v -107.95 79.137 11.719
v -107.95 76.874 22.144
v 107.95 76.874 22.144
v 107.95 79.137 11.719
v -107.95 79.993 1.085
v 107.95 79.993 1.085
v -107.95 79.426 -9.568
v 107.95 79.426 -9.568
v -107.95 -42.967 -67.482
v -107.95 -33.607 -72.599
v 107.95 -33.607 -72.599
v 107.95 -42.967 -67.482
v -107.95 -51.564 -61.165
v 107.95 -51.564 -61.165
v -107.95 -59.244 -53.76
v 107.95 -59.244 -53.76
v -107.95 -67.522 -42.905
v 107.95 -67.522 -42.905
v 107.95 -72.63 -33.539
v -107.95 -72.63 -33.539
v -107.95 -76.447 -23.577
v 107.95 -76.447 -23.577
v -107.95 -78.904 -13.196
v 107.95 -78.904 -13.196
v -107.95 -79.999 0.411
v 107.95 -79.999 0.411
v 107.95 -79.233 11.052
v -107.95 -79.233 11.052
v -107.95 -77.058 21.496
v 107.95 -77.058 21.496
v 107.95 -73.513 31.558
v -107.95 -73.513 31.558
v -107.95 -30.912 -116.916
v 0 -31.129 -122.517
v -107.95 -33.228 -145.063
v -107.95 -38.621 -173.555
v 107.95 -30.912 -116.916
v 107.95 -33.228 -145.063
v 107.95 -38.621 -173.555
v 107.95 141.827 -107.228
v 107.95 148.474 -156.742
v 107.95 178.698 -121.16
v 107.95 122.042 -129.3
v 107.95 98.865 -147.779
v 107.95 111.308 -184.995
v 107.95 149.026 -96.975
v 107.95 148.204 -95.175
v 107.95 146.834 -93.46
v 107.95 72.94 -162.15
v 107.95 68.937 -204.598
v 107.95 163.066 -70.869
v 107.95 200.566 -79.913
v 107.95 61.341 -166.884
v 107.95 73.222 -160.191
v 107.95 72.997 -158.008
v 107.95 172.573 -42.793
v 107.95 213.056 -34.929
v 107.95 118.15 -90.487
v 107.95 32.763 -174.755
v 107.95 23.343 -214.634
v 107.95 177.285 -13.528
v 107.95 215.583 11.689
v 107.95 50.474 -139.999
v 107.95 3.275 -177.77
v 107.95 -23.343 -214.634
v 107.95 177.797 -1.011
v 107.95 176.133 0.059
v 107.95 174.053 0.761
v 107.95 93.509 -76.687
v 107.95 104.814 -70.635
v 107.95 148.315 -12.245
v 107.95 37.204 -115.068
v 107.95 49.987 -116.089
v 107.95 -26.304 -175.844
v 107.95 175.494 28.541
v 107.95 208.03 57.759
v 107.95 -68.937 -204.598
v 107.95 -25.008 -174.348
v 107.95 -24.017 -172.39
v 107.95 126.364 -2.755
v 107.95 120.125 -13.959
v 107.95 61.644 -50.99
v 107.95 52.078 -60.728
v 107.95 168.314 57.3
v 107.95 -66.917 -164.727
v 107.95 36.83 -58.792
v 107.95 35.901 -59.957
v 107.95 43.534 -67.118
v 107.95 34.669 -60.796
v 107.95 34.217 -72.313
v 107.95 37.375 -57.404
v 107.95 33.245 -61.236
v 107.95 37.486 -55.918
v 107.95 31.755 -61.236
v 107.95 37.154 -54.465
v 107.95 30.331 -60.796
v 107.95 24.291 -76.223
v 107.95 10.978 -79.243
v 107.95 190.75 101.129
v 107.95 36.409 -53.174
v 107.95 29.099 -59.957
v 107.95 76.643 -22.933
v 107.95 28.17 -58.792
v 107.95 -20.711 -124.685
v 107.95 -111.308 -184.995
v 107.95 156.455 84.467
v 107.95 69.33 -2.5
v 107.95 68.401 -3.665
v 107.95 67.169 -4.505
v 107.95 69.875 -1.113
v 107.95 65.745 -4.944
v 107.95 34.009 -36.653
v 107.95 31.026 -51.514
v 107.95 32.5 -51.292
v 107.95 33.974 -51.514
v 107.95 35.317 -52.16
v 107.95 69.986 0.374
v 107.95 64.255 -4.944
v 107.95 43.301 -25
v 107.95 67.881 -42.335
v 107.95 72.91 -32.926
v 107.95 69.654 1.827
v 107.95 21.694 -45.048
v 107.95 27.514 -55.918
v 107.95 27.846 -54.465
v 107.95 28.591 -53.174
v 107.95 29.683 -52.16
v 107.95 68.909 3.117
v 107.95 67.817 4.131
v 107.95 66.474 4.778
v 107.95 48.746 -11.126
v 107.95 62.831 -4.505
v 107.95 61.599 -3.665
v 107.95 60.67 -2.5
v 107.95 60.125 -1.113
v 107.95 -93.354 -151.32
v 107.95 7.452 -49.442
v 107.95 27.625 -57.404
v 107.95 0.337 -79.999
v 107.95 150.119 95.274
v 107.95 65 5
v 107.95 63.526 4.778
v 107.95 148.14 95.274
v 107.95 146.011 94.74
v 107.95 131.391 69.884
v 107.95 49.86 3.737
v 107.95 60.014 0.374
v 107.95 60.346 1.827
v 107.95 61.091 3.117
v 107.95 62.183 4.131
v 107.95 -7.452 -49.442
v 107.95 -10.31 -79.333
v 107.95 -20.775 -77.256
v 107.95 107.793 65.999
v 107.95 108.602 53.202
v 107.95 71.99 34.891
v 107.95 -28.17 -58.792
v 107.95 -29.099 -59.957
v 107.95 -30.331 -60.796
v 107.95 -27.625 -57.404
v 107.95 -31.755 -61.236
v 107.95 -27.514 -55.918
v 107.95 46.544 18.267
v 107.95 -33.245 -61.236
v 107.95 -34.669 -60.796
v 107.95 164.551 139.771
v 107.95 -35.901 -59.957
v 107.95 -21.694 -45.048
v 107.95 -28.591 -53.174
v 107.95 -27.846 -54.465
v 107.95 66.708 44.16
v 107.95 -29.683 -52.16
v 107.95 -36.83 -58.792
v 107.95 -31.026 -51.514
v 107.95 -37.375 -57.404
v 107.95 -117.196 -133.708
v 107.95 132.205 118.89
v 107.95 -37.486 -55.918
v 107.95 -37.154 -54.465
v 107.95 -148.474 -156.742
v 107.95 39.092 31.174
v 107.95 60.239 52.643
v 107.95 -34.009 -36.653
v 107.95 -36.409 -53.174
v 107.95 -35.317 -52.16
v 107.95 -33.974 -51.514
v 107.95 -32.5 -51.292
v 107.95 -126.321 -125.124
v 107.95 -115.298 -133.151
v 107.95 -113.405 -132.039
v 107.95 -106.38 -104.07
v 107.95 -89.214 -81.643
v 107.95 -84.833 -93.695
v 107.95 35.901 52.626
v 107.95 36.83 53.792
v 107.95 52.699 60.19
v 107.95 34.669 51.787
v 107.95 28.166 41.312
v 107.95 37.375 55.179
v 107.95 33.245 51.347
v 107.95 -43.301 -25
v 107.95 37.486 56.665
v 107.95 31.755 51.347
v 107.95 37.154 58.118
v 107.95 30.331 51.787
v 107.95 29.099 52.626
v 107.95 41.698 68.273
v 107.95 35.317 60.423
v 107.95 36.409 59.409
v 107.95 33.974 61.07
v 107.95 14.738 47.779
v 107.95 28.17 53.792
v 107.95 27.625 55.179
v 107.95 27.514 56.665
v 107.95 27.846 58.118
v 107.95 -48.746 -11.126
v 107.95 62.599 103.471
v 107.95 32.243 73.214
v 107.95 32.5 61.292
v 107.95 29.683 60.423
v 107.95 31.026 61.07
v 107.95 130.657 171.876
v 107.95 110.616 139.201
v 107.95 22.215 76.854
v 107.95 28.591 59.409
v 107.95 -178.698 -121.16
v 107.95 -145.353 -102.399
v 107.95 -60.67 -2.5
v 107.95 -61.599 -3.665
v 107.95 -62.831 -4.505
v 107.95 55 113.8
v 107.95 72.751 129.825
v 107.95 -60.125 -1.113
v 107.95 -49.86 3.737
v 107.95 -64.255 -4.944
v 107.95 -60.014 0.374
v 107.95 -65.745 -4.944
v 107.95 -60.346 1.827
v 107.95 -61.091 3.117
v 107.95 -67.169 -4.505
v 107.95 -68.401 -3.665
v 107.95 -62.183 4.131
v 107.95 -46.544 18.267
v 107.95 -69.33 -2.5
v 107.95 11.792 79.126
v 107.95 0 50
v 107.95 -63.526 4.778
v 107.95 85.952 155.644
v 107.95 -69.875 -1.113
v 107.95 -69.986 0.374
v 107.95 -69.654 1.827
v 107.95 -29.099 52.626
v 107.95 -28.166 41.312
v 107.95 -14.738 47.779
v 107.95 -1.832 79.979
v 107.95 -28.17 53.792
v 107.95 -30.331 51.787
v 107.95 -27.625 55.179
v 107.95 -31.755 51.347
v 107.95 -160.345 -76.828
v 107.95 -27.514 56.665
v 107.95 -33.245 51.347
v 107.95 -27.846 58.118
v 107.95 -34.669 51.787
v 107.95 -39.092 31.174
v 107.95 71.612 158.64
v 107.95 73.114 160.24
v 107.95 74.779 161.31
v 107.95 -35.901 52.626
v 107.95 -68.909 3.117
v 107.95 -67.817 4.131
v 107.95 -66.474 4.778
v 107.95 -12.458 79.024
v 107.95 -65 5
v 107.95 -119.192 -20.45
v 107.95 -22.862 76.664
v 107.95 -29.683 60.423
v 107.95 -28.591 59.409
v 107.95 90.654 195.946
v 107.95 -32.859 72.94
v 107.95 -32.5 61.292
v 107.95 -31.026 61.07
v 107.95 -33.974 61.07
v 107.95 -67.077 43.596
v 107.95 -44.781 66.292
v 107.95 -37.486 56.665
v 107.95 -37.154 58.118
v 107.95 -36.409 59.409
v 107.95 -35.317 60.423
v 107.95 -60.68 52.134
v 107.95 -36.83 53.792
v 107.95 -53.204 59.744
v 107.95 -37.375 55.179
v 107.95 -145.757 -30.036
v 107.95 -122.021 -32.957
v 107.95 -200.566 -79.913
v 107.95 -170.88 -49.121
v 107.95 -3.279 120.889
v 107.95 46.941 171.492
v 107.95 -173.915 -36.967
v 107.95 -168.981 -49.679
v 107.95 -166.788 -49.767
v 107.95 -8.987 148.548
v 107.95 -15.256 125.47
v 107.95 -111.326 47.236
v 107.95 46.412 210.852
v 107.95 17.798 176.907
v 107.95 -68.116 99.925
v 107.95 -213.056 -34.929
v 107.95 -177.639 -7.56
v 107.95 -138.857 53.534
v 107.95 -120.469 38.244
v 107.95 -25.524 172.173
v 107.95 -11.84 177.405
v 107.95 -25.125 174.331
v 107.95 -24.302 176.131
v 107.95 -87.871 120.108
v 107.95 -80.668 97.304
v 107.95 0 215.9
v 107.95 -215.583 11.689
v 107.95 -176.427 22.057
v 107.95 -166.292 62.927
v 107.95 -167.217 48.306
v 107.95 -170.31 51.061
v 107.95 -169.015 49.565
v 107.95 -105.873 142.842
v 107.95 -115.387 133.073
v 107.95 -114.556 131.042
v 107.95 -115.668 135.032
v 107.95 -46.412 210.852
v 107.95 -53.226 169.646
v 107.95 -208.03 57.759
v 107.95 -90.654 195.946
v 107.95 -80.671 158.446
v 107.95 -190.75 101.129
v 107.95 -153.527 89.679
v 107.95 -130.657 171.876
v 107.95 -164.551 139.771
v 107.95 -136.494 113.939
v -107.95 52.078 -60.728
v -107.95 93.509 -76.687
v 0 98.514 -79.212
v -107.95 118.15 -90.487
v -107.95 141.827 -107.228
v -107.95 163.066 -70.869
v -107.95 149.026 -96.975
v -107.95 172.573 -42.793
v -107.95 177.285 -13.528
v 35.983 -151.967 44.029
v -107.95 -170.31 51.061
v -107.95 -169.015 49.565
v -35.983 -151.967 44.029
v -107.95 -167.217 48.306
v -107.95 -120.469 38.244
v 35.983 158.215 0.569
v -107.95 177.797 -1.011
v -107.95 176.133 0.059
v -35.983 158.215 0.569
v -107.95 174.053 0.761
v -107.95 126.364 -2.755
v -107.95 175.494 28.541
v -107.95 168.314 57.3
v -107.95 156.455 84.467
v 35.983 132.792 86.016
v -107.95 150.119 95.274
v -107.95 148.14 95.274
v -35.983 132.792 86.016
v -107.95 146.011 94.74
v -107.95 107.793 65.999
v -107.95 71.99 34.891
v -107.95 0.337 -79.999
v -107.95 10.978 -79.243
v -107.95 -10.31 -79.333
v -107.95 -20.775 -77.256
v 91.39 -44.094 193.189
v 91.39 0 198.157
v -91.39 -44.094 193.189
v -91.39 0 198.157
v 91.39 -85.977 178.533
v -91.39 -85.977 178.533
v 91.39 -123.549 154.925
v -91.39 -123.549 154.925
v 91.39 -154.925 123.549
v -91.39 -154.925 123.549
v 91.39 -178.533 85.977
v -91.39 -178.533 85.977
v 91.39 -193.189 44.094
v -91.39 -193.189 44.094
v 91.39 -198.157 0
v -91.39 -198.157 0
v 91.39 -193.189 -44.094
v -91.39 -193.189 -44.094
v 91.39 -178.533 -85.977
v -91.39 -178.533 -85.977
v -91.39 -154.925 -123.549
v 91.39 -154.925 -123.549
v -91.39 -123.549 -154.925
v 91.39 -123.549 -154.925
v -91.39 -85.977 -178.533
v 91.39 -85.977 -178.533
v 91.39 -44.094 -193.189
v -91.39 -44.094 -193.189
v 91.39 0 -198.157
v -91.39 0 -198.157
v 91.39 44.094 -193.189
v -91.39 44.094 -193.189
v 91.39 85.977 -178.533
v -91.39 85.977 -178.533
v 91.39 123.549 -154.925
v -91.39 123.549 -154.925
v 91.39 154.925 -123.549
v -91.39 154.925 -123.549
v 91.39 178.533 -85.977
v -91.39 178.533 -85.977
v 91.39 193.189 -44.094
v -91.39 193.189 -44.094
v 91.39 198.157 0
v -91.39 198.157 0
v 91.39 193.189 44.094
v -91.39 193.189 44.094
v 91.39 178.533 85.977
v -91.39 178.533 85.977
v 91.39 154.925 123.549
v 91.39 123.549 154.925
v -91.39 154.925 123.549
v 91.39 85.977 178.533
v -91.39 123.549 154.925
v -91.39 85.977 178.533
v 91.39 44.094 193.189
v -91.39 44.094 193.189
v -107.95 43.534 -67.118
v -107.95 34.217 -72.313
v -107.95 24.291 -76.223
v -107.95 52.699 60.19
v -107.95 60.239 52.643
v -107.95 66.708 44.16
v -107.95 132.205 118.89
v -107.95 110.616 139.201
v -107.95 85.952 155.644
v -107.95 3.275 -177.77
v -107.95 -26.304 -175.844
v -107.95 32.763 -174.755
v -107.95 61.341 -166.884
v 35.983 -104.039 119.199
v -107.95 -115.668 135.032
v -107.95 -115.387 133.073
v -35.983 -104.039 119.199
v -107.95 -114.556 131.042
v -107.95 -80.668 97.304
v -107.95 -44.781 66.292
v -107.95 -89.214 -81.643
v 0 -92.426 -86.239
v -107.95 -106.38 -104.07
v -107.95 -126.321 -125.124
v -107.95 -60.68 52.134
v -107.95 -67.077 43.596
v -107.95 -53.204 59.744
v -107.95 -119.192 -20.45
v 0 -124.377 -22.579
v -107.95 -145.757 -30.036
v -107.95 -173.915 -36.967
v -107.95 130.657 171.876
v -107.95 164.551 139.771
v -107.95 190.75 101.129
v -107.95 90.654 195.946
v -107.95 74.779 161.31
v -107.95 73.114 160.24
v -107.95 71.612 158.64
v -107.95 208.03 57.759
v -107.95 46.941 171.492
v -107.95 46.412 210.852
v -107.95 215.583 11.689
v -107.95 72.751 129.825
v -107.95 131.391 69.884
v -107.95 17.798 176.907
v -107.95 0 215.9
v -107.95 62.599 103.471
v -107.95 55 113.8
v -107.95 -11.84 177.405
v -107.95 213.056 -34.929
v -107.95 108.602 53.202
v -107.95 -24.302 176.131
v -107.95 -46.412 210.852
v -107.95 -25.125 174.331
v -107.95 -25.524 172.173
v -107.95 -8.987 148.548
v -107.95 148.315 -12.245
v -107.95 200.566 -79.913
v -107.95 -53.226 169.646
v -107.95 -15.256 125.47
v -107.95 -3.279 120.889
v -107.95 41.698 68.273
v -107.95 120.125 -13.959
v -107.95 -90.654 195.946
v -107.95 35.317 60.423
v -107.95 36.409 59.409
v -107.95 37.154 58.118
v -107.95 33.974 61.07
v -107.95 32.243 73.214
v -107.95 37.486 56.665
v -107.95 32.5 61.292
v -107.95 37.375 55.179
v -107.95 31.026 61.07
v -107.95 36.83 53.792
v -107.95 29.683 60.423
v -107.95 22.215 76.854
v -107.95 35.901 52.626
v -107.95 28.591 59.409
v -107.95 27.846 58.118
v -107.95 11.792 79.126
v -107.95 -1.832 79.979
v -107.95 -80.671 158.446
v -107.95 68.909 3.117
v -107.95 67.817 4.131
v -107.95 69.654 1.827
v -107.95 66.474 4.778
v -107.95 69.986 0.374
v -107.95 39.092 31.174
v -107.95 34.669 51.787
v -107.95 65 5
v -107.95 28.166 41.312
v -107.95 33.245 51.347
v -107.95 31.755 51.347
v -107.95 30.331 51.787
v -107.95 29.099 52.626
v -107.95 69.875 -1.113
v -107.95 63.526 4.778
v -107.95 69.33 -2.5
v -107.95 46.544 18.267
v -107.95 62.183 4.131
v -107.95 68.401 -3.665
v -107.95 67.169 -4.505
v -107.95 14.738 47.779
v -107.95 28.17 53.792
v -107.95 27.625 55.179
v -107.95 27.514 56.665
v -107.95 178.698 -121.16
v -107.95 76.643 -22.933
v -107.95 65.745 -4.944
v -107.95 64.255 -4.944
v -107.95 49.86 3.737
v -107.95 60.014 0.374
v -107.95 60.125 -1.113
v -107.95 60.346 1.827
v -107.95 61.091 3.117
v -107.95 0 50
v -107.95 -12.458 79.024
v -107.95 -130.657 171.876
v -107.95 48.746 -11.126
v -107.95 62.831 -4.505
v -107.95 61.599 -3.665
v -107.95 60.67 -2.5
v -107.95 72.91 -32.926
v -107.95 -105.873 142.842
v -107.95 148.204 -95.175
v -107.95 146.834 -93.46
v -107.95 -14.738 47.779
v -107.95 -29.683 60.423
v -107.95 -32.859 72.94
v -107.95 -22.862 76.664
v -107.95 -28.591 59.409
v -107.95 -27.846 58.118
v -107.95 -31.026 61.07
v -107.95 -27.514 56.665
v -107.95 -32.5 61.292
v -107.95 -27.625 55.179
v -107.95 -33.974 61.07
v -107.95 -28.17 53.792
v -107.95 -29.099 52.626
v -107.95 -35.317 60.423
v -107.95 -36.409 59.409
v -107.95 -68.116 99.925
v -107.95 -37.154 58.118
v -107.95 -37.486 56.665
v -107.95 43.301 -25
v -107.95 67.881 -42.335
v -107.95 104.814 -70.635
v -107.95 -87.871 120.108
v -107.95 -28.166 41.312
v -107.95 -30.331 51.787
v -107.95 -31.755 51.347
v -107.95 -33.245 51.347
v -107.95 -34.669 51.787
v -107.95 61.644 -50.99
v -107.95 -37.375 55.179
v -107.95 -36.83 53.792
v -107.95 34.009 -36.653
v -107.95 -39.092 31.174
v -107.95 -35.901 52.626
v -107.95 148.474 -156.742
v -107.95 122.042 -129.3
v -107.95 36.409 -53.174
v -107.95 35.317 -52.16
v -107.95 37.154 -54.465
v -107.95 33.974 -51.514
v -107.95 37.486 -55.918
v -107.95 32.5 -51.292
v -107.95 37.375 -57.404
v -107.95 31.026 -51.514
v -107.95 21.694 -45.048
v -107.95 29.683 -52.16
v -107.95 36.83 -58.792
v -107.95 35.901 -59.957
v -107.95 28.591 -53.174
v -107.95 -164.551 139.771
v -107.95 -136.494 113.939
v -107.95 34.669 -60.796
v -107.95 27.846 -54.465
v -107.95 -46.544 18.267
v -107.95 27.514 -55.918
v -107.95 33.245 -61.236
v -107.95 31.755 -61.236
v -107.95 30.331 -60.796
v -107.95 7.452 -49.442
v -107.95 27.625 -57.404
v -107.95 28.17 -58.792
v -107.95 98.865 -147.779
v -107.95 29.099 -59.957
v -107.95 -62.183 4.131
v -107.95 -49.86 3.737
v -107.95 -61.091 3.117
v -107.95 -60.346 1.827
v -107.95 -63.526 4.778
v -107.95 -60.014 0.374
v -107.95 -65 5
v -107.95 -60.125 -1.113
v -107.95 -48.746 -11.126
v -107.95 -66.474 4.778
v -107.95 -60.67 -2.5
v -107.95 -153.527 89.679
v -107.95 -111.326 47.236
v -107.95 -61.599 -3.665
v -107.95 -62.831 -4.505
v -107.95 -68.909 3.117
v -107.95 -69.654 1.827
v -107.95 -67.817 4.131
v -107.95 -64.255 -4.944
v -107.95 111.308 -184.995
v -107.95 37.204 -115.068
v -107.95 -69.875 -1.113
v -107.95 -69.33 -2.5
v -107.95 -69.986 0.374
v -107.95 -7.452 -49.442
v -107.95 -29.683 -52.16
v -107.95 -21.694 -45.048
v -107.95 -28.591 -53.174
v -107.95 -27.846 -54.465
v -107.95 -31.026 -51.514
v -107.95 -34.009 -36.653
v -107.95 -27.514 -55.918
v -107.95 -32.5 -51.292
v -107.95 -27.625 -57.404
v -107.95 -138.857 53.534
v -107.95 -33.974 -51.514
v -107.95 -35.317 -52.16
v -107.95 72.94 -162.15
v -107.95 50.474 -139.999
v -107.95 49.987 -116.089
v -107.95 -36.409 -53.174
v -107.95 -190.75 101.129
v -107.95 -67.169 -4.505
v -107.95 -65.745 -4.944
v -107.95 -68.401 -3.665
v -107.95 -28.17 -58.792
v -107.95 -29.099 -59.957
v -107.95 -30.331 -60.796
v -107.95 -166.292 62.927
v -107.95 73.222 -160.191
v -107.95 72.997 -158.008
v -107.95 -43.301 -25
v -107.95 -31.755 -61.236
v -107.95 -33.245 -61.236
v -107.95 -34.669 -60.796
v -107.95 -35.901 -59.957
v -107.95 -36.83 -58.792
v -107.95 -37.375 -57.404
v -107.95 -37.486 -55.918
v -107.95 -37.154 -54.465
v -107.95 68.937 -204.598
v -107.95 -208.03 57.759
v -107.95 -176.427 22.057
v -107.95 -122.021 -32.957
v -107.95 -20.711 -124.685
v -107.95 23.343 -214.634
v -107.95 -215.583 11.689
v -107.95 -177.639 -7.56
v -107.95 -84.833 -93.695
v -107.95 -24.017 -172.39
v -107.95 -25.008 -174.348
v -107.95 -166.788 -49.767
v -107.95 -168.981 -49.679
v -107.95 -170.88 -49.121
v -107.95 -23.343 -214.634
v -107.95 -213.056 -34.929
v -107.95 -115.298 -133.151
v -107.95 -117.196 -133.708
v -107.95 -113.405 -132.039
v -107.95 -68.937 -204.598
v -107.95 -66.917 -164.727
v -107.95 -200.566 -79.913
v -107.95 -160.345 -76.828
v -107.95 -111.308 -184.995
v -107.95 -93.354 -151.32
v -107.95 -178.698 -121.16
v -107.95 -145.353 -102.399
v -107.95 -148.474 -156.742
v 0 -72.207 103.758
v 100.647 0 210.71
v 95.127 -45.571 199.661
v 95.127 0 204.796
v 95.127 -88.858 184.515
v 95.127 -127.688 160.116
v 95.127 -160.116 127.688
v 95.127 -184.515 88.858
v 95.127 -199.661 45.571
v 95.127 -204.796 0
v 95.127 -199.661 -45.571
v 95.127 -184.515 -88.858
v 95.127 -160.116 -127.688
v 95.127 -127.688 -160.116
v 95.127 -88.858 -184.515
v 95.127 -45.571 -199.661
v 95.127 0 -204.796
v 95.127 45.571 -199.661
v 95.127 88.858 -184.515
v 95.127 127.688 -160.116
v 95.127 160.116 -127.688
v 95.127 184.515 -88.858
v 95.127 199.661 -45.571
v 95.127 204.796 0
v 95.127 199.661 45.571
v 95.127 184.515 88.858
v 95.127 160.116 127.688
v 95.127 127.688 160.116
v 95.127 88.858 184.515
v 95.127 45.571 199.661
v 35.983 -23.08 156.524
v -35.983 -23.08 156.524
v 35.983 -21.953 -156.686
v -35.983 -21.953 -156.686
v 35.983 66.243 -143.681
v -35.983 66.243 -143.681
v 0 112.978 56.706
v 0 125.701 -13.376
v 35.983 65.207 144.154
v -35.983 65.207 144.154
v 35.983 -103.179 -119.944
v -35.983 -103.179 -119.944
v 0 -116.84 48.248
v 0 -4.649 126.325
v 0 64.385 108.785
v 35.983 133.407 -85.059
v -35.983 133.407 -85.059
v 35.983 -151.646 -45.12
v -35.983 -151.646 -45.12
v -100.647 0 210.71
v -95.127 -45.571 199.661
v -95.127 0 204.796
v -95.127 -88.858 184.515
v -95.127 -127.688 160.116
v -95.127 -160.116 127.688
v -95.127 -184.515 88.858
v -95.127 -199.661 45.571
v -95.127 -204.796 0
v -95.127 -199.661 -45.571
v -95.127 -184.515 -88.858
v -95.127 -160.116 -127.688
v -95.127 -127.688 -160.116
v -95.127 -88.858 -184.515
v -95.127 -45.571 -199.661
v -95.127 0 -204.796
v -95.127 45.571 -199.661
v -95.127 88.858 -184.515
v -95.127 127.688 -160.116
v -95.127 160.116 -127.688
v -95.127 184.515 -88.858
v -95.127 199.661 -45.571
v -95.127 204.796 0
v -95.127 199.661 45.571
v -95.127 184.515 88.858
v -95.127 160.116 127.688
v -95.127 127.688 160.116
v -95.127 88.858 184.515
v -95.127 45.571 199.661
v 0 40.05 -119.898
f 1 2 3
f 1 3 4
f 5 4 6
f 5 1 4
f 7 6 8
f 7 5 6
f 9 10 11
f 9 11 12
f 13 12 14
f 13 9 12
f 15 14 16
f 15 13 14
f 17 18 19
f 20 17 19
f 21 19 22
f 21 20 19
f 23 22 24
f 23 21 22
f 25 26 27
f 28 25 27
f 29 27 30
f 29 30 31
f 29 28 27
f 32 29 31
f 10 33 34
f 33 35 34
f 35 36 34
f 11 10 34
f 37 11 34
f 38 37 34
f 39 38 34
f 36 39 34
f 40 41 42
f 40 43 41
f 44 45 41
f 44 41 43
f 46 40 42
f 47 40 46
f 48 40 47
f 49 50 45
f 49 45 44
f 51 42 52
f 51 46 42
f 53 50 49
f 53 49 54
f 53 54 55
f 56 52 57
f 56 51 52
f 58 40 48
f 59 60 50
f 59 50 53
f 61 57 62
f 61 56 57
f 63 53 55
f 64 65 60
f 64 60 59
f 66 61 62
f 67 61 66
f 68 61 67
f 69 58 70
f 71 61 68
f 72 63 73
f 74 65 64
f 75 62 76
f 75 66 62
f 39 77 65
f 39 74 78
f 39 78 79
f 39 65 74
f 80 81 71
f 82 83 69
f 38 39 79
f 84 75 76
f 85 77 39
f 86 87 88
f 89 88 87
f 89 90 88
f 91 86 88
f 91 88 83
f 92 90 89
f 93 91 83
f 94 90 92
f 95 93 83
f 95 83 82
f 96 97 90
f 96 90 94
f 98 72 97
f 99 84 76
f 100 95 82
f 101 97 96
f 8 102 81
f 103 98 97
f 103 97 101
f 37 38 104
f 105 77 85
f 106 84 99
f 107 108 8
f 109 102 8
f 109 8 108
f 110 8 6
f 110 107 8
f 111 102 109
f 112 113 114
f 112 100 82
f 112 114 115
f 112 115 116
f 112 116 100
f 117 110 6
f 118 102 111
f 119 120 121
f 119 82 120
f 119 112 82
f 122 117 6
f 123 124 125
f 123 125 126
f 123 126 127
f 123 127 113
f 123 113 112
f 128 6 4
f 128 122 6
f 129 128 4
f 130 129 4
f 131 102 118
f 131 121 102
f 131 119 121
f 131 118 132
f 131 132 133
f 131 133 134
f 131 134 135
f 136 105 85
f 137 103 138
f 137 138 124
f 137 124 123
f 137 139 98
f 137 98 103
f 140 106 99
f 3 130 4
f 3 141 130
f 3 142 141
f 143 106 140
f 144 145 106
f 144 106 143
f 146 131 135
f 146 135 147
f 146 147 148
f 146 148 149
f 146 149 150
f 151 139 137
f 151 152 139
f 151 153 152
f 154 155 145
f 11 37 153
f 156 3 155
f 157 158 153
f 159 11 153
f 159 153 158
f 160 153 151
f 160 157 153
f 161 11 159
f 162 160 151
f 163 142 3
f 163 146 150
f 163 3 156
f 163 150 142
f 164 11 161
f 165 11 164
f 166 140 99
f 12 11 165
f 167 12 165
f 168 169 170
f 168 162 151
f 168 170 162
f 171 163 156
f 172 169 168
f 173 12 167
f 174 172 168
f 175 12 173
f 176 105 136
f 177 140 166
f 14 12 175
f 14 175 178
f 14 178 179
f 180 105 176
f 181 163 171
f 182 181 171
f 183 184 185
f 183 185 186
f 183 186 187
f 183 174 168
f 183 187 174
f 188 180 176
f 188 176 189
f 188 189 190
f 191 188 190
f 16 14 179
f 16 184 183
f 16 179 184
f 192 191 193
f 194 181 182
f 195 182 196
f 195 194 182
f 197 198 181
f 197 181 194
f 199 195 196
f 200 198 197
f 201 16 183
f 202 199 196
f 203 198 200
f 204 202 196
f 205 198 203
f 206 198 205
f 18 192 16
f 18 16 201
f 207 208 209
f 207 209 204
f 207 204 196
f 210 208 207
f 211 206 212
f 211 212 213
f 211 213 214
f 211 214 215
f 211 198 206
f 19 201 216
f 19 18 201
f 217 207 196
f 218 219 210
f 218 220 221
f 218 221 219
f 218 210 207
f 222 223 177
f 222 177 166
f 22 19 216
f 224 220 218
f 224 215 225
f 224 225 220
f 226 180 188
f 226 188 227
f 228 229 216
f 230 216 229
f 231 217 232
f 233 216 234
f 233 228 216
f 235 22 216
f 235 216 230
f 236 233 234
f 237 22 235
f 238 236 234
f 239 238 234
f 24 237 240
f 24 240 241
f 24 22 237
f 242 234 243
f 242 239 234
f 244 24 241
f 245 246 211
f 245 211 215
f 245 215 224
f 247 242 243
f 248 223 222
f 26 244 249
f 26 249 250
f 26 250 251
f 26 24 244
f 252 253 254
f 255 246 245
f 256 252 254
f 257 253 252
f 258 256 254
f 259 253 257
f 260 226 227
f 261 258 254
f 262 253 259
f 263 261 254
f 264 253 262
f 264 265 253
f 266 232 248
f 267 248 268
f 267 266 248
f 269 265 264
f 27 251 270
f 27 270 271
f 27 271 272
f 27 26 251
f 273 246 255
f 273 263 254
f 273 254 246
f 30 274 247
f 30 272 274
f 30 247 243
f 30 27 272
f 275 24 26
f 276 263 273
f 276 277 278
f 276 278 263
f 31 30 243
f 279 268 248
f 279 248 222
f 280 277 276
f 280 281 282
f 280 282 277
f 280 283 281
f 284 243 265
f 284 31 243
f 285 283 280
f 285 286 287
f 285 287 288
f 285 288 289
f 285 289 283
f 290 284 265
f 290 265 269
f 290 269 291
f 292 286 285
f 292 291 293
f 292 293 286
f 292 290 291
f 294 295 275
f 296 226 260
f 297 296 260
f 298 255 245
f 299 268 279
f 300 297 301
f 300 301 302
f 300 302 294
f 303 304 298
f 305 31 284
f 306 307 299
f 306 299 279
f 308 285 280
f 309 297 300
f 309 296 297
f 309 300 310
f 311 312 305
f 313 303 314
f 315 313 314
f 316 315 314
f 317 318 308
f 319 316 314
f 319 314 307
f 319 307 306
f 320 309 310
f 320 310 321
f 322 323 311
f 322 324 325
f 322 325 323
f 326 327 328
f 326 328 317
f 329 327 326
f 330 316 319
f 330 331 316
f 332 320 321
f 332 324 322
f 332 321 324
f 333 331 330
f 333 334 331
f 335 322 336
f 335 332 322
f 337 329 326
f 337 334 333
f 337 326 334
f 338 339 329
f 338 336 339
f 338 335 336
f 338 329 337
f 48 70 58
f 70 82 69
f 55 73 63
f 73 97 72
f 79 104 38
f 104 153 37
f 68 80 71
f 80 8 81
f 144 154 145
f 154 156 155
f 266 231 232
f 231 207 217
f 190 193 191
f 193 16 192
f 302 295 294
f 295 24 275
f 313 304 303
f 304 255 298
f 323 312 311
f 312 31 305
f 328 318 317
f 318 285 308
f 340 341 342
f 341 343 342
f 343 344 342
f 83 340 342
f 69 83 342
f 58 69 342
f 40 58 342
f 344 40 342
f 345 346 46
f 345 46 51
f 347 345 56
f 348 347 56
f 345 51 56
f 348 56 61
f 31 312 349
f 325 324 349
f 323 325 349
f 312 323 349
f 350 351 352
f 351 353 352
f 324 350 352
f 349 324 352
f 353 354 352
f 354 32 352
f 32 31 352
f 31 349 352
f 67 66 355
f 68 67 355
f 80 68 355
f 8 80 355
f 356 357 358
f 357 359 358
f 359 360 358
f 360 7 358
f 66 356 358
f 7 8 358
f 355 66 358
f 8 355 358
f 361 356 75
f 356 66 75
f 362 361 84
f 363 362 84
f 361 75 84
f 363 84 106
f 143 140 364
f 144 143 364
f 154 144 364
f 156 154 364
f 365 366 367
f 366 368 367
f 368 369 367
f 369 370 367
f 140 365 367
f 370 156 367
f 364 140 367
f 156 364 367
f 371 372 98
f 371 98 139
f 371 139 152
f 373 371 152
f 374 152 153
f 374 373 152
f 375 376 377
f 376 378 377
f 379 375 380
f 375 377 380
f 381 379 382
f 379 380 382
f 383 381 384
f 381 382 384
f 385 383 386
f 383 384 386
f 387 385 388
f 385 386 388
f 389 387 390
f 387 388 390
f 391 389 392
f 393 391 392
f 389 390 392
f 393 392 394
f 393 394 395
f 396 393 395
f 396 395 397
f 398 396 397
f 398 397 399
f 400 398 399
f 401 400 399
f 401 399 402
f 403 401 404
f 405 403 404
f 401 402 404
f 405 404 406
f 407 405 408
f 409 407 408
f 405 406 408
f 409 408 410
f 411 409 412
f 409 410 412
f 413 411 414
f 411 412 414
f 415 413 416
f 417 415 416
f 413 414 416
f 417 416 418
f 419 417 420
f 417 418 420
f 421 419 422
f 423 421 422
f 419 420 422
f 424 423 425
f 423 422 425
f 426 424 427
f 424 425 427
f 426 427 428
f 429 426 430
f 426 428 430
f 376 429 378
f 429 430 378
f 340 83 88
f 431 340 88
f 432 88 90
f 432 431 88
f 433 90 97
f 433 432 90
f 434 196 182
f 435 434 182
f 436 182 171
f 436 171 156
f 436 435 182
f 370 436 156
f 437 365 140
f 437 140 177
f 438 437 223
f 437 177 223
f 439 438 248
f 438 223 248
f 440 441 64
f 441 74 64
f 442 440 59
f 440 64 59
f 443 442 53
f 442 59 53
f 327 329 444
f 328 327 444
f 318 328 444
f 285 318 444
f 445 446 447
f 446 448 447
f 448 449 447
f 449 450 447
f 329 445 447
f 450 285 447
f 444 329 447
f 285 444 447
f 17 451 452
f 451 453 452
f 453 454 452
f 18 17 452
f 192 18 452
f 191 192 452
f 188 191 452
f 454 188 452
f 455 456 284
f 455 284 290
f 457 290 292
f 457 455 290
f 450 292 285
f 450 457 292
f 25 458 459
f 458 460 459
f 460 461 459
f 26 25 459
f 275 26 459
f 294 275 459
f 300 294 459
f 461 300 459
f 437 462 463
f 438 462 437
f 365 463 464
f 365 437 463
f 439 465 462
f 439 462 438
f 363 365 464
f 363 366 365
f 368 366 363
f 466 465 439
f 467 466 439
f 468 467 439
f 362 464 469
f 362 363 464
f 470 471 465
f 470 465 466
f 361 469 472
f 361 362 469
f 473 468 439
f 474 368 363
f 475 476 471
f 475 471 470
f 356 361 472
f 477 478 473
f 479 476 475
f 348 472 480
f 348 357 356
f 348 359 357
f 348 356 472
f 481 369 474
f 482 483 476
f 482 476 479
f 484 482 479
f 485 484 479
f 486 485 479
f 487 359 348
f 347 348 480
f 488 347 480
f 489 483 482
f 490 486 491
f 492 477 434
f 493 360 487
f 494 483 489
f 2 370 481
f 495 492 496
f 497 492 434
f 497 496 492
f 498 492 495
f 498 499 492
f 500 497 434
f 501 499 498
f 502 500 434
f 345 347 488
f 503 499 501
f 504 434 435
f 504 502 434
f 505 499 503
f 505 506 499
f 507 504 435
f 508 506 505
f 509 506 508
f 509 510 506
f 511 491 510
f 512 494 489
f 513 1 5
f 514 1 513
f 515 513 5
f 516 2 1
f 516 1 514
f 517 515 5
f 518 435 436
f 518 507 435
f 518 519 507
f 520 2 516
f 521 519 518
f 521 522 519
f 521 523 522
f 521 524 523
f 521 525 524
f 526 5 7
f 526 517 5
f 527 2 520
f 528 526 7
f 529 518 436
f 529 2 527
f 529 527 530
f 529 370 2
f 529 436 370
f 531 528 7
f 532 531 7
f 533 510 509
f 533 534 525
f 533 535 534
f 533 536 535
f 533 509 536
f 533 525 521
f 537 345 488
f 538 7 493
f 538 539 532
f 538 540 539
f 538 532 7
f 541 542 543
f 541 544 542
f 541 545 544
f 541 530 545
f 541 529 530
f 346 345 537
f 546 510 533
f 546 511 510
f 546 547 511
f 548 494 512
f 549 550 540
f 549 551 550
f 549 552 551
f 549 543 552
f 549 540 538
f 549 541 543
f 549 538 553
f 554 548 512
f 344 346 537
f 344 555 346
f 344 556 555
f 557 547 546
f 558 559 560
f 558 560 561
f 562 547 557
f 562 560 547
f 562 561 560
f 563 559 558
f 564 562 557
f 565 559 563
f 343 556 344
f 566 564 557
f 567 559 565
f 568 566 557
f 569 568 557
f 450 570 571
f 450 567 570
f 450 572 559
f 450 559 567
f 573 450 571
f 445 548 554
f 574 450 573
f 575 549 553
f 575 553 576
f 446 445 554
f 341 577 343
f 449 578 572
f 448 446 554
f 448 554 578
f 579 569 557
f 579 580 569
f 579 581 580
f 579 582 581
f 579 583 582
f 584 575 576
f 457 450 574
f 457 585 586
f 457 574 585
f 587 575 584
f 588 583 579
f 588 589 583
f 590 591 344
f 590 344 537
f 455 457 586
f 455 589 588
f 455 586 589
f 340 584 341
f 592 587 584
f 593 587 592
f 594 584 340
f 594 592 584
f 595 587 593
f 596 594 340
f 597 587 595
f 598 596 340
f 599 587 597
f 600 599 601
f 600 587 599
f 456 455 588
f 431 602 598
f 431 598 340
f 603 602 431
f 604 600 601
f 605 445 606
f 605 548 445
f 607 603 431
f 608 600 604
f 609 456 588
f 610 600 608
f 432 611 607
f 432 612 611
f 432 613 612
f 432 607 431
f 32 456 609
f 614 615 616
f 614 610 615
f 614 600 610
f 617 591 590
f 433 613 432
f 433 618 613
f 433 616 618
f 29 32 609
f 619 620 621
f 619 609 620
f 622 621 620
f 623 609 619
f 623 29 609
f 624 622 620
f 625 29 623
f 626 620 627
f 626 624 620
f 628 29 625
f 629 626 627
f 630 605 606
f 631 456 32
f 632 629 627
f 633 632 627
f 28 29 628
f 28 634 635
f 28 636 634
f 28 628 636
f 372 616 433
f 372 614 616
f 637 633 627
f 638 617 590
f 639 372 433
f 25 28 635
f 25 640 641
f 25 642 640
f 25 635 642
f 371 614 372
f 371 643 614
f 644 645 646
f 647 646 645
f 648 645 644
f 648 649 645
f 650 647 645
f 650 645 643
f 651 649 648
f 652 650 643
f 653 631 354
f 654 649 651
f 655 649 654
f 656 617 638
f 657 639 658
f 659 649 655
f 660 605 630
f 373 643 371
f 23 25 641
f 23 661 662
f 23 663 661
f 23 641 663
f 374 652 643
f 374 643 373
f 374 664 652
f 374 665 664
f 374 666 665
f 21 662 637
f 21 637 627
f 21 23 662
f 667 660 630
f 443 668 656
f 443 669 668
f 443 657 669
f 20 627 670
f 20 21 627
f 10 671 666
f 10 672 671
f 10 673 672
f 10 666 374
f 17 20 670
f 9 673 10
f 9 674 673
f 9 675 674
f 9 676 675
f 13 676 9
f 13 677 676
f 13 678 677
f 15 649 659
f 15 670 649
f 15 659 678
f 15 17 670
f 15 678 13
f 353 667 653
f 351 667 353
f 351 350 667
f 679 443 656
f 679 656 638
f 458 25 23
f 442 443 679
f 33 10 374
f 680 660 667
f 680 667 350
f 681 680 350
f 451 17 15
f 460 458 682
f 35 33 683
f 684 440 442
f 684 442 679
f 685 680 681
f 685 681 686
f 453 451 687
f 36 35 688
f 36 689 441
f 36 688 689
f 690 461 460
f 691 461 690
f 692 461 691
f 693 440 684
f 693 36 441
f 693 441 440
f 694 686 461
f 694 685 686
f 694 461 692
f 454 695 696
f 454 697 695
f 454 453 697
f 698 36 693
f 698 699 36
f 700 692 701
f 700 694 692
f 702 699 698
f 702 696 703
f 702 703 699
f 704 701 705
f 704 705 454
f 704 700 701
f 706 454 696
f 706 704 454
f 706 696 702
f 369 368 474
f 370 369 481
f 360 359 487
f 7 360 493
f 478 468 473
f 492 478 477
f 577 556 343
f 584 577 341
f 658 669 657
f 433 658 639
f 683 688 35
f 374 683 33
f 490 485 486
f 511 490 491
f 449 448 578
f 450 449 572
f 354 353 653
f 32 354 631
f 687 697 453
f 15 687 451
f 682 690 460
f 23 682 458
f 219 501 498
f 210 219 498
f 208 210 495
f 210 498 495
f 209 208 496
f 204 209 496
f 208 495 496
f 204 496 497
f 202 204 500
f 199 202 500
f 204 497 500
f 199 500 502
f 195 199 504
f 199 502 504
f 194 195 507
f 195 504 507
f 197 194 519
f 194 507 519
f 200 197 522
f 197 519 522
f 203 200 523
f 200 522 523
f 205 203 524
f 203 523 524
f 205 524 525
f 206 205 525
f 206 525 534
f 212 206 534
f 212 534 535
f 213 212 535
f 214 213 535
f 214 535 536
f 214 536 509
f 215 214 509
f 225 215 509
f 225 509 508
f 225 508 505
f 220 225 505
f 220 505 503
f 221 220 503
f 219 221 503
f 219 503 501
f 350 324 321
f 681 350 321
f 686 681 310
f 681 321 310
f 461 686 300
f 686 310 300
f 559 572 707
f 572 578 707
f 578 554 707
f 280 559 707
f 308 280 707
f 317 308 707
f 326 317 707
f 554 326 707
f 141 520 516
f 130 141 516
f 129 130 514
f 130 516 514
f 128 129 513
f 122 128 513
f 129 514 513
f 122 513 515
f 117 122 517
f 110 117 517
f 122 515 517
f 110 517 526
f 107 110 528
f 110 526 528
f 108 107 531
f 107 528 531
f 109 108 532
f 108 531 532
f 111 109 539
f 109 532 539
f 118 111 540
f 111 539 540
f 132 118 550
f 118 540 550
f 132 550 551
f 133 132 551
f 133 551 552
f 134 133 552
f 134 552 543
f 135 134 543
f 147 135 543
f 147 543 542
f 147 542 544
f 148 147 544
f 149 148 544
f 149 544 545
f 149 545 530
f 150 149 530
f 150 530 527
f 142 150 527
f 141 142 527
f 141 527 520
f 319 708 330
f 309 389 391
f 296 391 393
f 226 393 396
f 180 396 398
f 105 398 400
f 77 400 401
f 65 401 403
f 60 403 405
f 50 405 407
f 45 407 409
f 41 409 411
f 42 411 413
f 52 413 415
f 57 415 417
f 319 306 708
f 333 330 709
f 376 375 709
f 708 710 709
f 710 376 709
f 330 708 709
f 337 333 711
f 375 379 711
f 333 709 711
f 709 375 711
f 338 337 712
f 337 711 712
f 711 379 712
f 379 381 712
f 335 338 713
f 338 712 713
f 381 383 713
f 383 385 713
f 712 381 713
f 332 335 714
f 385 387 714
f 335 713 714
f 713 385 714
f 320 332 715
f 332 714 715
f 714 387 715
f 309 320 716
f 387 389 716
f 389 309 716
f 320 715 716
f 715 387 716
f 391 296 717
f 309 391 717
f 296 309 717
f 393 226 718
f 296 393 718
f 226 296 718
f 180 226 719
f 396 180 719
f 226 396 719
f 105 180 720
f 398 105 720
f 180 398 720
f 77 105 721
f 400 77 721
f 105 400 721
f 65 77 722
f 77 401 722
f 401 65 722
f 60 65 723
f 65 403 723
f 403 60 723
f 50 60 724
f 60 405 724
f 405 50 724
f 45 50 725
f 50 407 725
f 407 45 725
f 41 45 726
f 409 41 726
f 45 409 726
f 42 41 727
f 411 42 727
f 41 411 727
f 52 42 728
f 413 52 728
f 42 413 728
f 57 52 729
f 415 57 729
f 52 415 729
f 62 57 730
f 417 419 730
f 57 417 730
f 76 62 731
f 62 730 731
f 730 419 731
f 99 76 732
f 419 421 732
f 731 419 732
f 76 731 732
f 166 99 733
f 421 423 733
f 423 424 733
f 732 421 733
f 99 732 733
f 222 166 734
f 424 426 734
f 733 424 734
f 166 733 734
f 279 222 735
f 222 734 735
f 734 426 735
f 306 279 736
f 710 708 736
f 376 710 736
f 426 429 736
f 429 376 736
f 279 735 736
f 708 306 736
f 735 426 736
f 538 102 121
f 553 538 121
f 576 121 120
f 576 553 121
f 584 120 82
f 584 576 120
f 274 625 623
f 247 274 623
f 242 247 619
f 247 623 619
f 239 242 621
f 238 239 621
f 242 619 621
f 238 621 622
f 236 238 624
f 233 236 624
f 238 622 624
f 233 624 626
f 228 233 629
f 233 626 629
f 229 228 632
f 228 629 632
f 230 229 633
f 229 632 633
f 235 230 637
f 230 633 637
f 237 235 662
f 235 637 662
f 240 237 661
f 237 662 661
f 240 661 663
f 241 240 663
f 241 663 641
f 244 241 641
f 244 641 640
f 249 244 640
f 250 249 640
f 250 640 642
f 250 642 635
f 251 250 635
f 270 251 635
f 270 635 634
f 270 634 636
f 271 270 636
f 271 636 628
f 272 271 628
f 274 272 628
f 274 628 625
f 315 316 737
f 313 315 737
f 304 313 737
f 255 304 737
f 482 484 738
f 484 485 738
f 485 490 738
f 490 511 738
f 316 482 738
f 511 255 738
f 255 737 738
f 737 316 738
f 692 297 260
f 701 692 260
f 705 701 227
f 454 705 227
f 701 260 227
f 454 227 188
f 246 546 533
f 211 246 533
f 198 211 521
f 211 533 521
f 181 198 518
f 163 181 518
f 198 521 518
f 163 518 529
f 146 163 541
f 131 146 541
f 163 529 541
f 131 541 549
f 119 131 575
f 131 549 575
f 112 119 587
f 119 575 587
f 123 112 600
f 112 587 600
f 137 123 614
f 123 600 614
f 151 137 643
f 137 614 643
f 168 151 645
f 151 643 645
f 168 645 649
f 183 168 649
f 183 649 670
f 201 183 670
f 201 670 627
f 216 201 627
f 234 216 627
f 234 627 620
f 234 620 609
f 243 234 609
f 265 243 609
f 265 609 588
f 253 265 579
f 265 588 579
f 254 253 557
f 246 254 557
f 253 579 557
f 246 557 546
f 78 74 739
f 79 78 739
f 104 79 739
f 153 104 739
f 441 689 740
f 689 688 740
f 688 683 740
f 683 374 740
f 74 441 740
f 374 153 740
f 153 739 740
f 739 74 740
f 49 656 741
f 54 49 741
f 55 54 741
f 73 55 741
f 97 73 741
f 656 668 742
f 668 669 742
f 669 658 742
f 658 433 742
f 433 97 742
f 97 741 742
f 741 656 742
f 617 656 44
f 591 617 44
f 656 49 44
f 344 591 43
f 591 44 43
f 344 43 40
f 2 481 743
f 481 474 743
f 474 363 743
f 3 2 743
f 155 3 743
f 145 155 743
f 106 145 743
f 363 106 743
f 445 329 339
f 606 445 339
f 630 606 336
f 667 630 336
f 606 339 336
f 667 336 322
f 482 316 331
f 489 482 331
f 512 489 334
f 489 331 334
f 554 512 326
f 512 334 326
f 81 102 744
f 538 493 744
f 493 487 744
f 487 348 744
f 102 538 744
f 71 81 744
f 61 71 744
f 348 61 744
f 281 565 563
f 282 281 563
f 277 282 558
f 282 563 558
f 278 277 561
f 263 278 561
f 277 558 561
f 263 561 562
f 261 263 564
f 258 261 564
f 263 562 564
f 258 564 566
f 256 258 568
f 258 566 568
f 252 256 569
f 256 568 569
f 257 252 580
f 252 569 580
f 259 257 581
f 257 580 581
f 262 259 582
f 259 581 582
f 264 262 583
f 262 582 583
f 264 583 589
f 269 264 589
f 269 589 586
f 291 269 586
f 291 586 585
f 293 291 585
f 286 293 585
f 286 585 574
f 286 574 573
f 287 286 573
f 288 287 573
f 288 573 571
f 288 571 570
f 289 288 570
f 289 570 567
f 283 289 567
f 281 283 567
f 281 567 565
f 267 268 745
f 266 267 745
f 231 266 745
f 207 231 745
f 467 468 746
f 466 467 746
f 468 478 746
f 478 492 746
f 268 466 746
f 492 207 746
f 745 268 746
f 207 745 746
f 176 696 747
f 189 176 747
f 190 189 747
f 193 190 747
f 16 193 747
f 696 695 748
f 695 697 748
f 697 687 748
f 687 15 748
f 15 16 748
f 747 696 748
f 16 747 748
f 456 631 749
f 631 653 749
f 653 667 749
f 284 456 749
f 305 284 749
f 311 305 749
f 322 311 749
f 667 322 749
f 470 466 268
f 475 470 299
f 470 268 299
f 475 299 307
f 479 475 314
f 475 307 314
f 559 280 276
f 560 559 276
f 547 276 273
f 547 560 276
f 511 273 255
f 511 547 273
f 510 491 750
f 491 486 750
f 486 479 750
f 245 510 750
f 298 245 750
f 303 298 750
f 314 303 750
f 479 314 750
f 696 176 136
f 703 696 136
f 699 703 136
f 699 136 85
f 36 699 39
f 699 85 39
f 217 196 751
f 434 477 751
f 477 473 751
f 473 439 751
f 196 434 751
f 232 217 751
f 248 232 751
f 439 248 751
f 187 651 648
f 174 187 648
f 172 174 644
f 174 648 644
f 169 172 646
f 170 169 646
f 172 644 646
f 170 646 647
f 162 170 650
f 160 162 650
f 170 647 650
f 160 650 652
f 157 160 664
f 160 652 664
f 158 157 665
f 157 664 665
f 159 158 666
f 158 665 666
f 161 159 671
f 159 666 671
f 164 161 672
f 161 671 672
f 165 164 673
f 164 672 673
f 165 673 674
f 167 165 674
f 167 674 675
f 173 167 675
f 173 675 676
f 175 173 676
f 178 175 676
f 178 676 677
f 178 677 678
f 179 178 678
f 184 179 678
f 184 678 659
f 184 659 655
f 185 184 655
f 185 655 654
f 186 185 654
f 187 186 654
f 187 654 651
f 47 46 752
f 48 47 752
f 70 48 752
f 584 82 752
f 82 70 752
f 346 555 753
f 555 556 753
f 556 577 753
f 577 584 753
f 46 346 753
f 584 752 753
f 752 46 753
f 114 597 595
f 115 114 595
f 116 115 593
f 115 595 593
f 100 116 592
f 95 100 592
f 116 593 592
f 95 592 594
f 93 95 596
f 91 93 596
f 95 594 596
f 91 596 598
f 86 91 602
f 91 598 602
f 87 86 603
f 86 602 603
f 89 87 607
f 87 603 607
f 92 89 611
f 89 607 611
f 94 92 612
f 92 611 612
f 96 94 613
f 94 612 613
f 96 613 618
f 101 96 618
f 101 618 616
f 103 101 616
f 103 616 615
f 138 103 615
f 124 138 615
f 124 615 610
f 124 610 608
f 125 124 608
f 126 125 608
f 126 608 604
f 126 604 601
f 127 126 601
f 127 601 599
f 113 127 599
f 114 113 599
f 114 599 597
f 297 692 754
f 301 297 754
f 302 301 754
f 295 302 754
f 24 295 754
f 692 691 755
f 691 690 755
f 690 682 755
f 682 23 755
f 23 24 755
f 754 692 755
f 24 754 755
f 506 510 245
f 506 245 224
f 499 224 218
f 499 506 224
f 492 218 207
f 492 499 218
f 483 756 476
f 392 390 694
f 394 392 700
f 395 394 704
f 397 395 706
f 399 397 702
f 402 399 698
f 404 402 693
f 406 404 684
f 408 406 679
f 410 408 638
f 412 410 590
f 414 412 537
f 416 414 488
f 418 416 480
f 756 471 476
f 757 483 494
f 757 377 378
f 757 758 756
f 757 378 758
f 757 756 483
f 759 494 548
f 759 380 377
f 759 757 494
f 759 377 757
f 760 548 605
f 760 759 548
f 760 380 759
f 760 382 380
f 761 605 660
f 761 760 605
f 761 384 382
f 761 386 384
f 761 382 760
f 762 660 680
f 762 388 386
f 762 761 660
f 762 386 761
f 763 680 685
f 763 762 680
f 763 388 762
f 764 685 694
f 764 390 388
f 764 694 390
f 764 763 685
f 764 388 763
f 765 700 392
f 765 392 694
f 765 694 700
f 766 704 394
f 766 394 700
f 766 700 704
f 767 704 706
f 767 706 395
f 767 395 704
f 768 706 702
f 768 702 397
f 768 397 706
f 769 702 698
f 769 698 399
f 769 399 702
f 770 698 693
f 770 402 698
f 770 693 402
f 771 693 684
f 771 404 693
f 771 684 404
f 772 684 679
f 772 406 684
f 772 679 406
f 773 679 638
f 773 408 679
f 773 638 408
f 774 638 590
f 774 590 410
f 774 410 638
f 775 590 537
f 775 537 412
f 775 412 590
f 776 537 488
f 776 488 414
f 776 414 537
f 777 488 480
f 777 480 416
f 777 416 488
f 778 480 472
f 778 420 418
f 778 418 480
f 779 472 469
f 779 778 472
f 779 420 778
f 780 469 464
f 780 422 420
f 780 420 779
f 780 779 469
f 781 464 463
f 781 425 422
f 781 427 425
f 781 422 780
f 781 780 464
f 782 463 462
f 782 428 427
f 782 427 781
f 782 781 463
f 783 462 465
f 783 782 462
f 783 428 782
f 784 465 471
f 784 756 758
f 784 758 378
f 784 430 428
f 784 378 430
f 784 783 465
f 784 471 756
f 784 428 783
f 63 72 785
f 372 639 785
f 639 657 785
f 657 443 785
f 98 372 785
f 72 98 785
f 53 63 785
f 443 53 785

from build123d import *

# Parameters (mm, degrees)
SKETCH4_R           = 80
SKETCH4_R_2         = 50
EXTRUDE_THIN3_DEPTH = 215.9
BOSS_EXTRUDE5_DEPTH = 215.9
SKETCH7_R           = 5
CUT_EXTRUDE1_DEPTH  = 374.949769527


with BuildPart() as part:
    # Sketch1 → Revolve2 (revolve)
    with BuildSketch(Plane.XY, mode=Mode.PRIVATE) as revolve2_sk:
        with BuildLine():
            add(Edge.make_bspline(
                [(-91.389791645, 198.157117378), (-87.737723978, 189.172063745), (-89.958333333, 177.8)],
                knots=[0.538920679, 0.538920679, 0.538920679, 1, 1, 1], degree=2))
            Line((-89.958333333, 177.8), (89.958333333, 177.8))
            add(Edge.make_bspline(
                [(91.389791645, 198.157117378), (87.737723978, 189.172063745), (89.958333333, 177.8)],
                knots=[0.538920679, 0.538920679, 0.538920679, 1, 1, 1], degree=2))
            Line((91.389791645, 198.157117378), (-91.389791645, 198.157117378))
        make_face()
        with BuildLine():
            add(Edge.make_bspline(
                [(-107.95, 215.9), (-85.142221979, 202.464007291), (-89.958333333, 177.8)],
                knots=[0, 0, 0, 1, 1, 1], degree=2))
            Line((-89.958333333, 177.8), (-107.95, 177.8))
            Line((-107.95, 177.8), (-107.95, 215.9))
        make_face()
        with BuildLine():
            Line((107.95, 215.9), (107.95, 177.8))
            Line((107.95, 177.8), (89.958333333, 177.8))
            add(Edge.make_bspline(
                [(107.95, 215.9), (85.142221979, 202.464007291), (89.958333333, 177.8)],
                knots=[0, 0, 0, 1, 1, 1], degree=2))
        make_face()
    revolve(revolve2_sk.sketch.rotate(Axis((0, 0, 0), (1, 0, 0)), 90), axis=Axis((0, 0, 0), (1, 0, 0)))



with BuildPart() as body_2:
    # Sketch4 → Extrude-Thin3 (new, through all)
    with BuildSketch(Plane.ZY.offset(107.95)):
        Circle(SKETCH4_R)
        Circle(SKETCH4_R_2, mode=Mode.SUBTRACT)
    extrude(amount=-EXTRUDE_THIN3_DEPTH)


with BuildPart() as part_1:
    add(part.part)

    add(body_2.part)  # Boss-Extrude5 merges body 2
    # Sketch5 → Boss-Extrude5 (add, through all)
    with BuildSketch(Plane.ZY.offset(107.95)):
        with BuildLine():
            add(Edge.make_bspline(
                [(84.466613731, 156.455204978), (103.265760756, 154.155986618), (86.563054422, 133.698232311), (61.815758586, 101.70440423), (37.155549156, 74.715687445), (20.962946955, 56.218812287)],
                knots=[0, 0, 0, 0, 0.24250624, 0.41767252, 1, 1, 1, 1], degree=3))
            add(Edge.make_bspline(
                [(0, 60), (11.003820956, 59.93238473), (20.962946955, 56.218812287)],
                knots=[0, 0, 0, 0.88641076, 0.88641076, 0.88641076], degree=2))
            add(Edge.make_bspline(
                [(0, 60), (53.338766253, 96.187425341), (84.466613731, 156.455204978)],
                knots=[0, 0, 0, 1, 1, 1], degree=2))
        make_face()
        with BuildLine():
            add(Edge.make_bspline(
                [(155.643907122, 85.952394823), (170.215704677, 73.854583039), (145.104196955, 65.674589761), (106.988277537, 52.13906711), (71.651587329, 42.767029552), (48.029337815, 35.96084967)],
                knots=[0, 0, 0, 0, 0.24250624, 0.41767252, 1, 1, 1, 1], degree=3))
            add(Edge.make_bspline(
                [(32.438449047, 50.47521197), (41.658896726, 44.469215628), (48.029337815, 35.96084967)],
                knots=[0, 0, 0, 0.88641076, 0.88641076, 0.88641076], degree=2))
            add(Edge.make_bspline(
                [(32.438449047, 50.47521197), (96.874273812, 52.080897193), (155.643907122, 85.952394823)],
                knots=[0, 0, 0, 1, 1, 1], degree=2))
        make_face()
        with BuildLine():
            add(Edge.make_bspline(
                [(177.405359729, -11.839693378), (183.123365051, -29.895128823), (157.575782211, -23.200271004), (118.192774313, -13.980055421), (83.398752791, -2.759858046), (59.846753279, 4.28557137)],
                knots=[0, 0, 0, 0, 0.24250624, 0.41767252, 1, 1, 1, 1], degree=3))
            add(Edge.make_bspline(
                [(54.577919721, 24.92490078), (59.087567133, 14.887384769), (59.846753279, 4.28557137)],
                knots=[0, 0, 0, 0.88641076, 0.88641076, 0.88641076], degree=2))
            add(Edge.make_bspline(
                [(54.577919721, 24.92490078), (109.652883917, -8.560947828), (177.405359729, -11.839693378)],
                knots=[0, 0, 0, 1, 1, 1], degree=2))
        make_face()
        with BuildLine():
            add(Edge.make_bspline(
                [(142.841864109, -105.872762587), (137.890650908, -124.153348513), (120.018169993, -104.709209651), (91.871900355, -75.660609134), (68.667403509, -47.410510215), (52.663247433, -28.750345559)],
                knots=[0, 0, 0, 0, 0.24250624, 0.41767252, 1, 1, 1, 1], degree=3))
            add(Edge.make_bspline(
                [(59.389286513, -8.538890296), (57.756352469, -19.421085565), (52.663247433, -28.750345559)],
                knots=[0, 0, 0, 0.88641076, 0.88641076, 0.88641076], degree=2))
            add(Edge.make_bspline(
                [(59.389286513, -8.538890296), (87.617478149, -66.484752402), (142.841864109, -105.872762587)],
                knots=[0, 0, 0, 1, 1, 1], degree=2))
        make_face()
        with BuildLine():
            add(Edge.make_bspline(
                [(-173.55482323, -38.620762988), (-184.128013151, -22.907647802), (-157.729127513, -22.133731004), (-117.343773244, -19.88498756), (-80.798059175, -20.848079458), (-56.215154285, -20.972754438)],
                knots=[0, 0, 0, 0, 0.24250624, 0.41767252, 1, 1, 1, 1], degree=3))
            add(Edge.make_bspline(
                [(-45.344974461, -39.291644037), (-52.499844517, -30.931232448), (-56.215154285, -20.972754438)],
                knots=[0, 0, 0, 0.88641076, 0.88641076, 0.88641076], degree=2))
            add(Edge.make_bspline(
                [(-45.344974461, -39.291644037), (-107.623069376, -22.678618063), (-173.55482323, -38.620762988)],
                knots=[0, 0, 0, 1, 1, 1], degree=2))
        make_face()
        with BuildLine():
            add(Edge.make_bspline(
                [(-166.883569054, 61.3409682), (-167.28315099, 80.275979904), (-144.656584174, 66.654725033), (-109.466499727, 46.712517455), (-79.242975447, 26.144208264), (-58.629924244, 12.748803202)],
                knots=[0, 0, 0, 0, 0.24250624, 0.41767252, 1, 1, 1, 1], degree=3))
            add(Edge.make_bspline(
                [(-59.389286513, -8.538890296), (-60.888366468, 2.362550284), (-58.629924244, 12.748803202)],
                knots=[0, 0, 0, 0.88641076, 0.88641076, 0.88641076], degree=2))
            add(Edge.make_bspline(
                [(-59.389286513, -8.538890296), (-102.799273935, 39.106956639), (-166.883569054, 61.3409682)],
                knots=[0, 0, 0, 1, 1, 1], degree=2))
        make_face()
        with BuildLine():
            add(Edge.make_bspline(
                [(-107.227960847, 141.827375399), (-97.327070356, 157.972551194), (-85.656597455, 134.280776832), (-66.834386, 98.479128232), (-52.528806919, 64.835894589), (-42.430107516, 42.422705904)],
                knots=[0, 0, 0, 0, 0.24250624, 0.41767252, 1, 1, 1, 1], degree=3))
            add(Edge.make_bspline(
                [(-54.577919721, 24.92490078), (-49.945262283, 34.906239994), (-42.430107516, 42.422705904)],
                knots=[0, 0, 0, 0.88641076, 0.88641076, 0.88641076], degree=2))
            add(Edge.make_bspline(
                [(-54.577919721, 24.92490078), (-65.337435364, 88.476348925), (-107.227960847, 141.827375399)],
                knots=[0, 0, 0, 1, 1, 1], degree=2))
        make_face()
        with BuildLine():
            add(Edge.make_bspline(
                [(-13.528232707, 177.284593013), (3.529667435, 185.51395366), (0.538753736, 159.27363077), (-2.982826947, 118.979311617), (-9.137113345, 82.94264249), (-12.759031447, 58.627699226)],
                knots=[0, 0, 0, 0, 0.24250624, 0.41767252, 1, 1, 1, 1], degree=3))
            add(Edge.make_bspline(
                [(-32.438449047, 50.47521197), (-23.144890219, 56.367445141), (-12.759031447, 58.627699226)],
                knots=[0, 0, 0, 0.88641076, 0.88641076, 0.88641076], degree=2))
            add(Edge.make_bspline(
                [(-32.438449047, 50.47521197), (-7.131422718, 109.755125571), (-13.528232707, 177.284593013)],
                knots=[0, 0, 0, 1, 1, 1], degree=2))
        make_face()
        with BuildLine():
            add(Edge.make_bspline(
                [(62.927085906, -166.291977736), (48.878629391, -178.993757276), (44.35563681, -152.973714073), (36.38234717, -113.319454039), (32.134638794, -77.008660377), (28.759532628, -52.658230914)],
                knots=[0, 0, 0, 0, 0.24250624, 0.41767252, 1, 1, 1, 1], degree=3))
            add(Edge.make_bspline(
                [(45.344974461, -39.291644037), (38.087903982, -47.563498455), (28.759532628, -52.658230914)],
                knots=[0, 0, 0, 0.88641076, 0.88641076, 0.88641076], degree=2))
            add(Edge.make_bspline(
                [(45.344974461, -39.291644037), (37.764142143, -103.300117847), (62.927085906, -166.291977736)],
                knots=[0, 0, 0, 1, 1, 1], degree=2))
        make_face()
        with BuildLine():
            add(Edge.make_bspline(
                [(-36.96659745, -173.914664916), (-55.652011598, -177.004912813), (-45.389497658, -152.670145138), (-30.658344176, -115.000172964), (-14.600646686, -82.157104987), (-4.275130581, -59.847500019)],
                knots=[0, 0, 0, 0, 0.24250624, 0.41767252, 1, 1, 1, 1], degree=3))
            add(Edge.make_bspline(
                [(16.90395341, -57.569578417), (6.326815098, -60.604836653), (-4.275130581, -59.847500019)],
                knots=[0, 0, 0, 0.88641076, 0.88641076, 0.88641076], degree=2))
            add(Edge.make_bspline(
                [(16.90395341, -57.569578417), (-24.079042164, -107.31842576), (-36.96659745, -173.914664916)],
                knots=[0, 0, 0, 1, 1, 1], degree=2))
        make_face()
        with BuildLine():
            add(Edge.make_bspline(
                [(-125.123647309, -126.320674808), (-142.513532123, -118.818259189), (-120.723787327, -103.894883837), (-87.965227868, -80.169149525), (-56.700330006, -61.221249258), (-35.952470037, -48.03561073)],
                knots=[0, 0, 0, 0, 0.24250624, 0.41767252, 1, 1, 1, 1], degree=3))
            add(Edge.make_bspline(
                [(-16.90395341, -57.569578417), (-27.442992877, -54.404567427), (-35.952470037, -48.03561073)],
                knots=[0, 0, 0, 0.88641076, 0.88641076, 0.88641076], degree=2))
            add(Edge.make_bspline(
                [(-16.90395341, -57.569578417), (-78.277300718, -77.263891769), (-125.123647309, -126.320674808)],
                knots=[0, 0, 0, 1, 1, 1], degree=2))
        make_face()
    extrude(amount=-BOSS_EXTRUDE5_DEPTH)

    # Sketch7 → Cut-Extrude1 (cut, through all)
    with BuildSketch(Plane.ZY.offset(107.95)):
        with Locations((-56.291651246, 32.5)):
            Circle(SKETCH7_R)
        with Locations((0, 65)):
            Circle(SKETCH7_R)
        with Locations((56.291651246, 32.5)):
            Circle(SKETCH7_R)
        with Locations((-56.291651246, -32.5)):
            Circle(SKETCH7_R)
        with Locations((0, -65)):
            Circle(SKETCH7_R)
        with Locations((56.291651246, -32.5)):
            Circle(SKETCH7_R)
    extrude(amount=-CUT_EXTRUDE1_DEPTH, mode=Mode.SUBTRACT)


solid = part_1.part
